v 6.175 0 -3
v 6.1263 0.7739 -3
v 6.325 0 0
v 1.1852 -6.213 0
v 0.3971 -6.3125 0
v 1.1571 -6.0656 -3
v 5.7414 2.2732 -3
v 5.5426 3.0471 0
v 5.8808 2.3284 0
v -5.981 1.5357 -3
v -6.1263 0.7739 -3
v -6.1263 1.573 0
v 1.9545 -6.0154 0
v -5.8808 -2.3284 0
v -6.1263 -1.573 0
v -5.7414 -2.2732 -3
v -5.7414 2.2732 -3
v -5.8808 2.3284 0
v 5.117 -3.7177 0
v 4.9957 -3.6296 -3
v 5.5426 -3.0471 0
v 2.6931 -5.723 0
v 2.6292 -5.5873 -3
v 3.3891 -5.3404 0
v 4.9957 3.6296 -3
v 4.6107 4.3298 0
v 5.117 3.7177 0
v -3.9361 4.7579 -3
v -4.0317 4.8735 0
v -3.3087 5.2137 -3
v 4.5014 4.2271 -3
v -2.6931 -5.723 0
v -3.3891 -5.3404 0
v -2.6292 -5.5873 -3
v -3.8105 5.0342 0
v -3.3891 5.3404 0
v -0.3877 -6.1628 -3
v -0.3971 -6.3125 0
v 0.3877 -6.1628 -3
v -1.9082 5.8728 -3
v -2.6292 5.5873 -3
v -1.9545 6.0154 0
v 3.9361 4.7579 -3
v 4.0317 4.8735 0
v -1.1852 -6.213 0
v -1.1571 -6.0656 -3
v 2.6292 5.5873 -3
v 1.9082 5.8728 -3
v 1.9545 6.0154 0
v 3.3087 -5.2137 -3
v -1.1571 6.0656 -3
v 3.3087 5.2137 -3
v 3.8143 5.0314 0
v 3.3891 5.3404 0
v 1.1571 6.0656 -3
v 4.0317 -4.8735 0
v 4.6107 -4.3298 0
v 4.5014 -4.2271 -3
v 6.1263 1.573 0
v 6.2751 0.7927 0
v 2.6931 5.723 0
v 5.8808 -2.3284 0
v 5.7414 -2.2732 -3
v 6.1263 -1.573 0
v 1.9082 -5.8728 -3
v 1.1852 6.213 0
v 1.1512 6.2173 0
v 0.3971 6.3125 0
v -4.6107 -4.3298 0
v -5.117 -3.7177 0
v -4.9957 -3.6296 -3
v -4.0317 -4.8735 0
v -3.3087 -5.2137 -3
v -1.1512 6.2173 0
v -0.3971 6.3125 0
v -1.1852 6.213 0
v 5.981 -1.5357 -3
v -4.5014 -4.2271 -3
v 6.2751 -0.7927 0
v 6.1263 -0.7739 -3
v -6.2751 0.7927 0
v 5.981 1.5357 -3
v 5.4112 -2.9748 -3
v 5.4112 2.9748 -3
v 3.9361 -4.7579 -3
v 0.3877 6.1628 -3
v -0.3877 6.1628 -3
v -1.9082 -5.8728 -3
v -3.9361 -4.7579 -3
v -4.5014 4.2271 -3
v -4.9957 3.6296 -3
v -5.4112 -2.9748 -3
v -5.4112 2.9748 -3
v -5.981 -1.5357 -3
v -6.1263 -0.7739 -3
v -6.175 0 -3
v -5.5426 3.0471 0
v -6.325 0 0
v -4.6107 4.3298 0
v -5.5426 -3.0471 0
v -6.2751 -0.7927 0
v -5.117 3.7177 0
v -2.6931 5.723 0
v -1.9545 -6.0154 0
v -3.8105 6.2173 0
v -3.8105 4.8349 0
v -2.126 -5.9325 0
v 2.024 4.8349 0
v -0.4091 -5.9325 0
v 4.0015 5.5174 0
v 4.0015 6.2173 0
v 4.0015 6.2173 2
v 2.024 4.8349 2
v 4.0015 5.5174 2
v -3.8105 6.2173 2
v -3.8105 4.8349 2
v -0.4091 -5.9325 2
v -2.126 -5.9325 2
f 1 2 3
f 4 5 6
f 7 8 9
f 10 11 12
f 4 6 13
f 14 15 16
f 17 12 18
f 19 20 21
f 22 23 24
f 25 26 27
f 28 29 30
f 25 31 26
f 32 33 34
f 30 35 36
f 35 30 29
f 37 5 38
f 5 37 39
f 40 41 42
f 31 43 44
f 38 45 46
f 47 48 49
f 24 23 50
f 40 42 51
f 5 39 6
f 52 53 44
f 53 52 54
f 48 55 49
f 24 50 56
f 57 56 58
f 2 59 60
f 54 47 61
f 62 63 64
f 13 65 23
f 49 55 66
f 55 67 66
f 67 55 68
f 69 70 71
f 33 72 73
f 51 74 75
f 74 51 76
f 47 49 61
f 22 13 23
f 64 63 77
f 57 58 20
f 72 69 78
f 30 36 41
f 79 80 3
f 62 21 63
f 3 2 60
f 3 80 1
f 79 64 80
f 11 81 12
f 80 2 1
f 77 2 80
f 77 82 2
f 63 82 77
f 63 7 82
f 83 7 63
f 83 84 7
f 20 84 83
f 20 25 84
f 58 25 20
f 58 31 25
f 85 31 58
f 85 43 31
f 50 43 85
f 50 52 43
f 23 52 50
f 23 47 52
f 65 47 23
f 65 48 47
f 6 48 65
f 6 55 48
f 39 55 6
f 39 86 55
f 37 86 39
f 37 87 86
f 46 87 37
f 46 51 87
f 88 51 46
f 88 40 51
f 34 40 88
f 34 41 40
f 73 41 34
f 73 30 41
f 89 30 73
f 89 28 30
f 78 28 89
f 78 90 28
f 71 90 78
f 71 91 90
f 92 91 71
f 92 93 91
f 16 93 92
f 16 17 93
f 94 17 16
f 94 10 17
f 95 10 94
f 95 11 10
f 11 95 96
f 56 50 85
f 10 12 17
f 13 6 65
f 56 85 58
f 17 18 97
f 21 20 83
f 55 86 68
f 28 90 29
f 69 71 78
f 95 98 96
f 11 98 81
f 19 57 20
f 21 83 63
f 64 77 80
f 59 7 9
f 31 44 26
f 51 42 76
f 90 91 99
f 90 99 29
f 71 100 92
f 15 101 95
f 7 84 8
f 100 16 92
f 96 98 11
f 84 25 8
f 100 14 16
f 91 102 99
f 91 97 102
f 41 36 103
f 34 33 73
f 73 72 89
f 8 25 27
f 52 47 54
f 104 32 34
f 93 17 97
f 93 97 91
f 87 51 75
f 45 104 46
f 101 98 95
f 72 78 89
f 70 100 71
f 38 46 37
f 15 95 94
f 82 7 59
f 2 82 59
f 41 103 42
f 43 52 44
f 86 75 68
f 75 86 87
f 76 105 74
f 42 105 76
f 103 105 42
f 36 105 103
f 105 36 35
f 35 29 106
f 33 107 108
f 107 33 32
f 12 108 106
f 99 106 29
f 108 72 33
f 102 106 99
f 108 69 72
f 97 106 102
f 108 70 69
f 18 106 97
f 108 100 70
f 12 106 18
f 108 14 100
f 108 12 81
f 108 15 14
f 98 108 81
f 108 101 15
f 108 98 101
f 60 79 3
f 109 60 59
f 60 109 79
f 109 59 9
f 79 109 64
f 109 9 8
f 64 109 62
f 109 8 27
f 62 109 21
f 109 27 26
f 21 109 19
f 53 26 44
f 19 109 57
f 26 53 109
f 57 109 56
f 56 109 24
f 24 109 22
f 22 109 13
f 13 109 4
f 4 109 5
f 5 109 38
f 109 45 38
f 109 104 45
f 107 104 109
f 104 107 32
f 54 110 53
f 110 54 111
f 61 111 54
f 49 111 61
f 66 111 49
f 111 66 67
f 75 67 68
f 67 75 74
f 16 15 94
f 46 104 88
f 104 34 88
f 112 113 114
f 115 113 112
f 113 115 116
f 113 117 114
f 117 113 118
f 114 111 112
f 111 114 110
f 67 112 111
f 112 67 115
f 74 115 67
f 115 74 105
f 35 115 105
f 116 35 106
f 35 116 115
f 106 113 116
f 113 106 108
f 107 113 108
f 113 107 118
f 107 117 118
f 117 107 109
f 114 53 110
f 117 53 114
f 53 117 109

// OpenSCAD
$fn = 50;

difference() {
	union() {
		translate(v = [0, 0, -3.0]) {
			cylinder(h = 3, r1 = 6.175, r2 = 6.325);
		}
		linear_extrude(height = 2) {
			text(font = "Impact", halign = "center", size = 12, text = "7", valign = "center");
		}
	}
	union();
}
